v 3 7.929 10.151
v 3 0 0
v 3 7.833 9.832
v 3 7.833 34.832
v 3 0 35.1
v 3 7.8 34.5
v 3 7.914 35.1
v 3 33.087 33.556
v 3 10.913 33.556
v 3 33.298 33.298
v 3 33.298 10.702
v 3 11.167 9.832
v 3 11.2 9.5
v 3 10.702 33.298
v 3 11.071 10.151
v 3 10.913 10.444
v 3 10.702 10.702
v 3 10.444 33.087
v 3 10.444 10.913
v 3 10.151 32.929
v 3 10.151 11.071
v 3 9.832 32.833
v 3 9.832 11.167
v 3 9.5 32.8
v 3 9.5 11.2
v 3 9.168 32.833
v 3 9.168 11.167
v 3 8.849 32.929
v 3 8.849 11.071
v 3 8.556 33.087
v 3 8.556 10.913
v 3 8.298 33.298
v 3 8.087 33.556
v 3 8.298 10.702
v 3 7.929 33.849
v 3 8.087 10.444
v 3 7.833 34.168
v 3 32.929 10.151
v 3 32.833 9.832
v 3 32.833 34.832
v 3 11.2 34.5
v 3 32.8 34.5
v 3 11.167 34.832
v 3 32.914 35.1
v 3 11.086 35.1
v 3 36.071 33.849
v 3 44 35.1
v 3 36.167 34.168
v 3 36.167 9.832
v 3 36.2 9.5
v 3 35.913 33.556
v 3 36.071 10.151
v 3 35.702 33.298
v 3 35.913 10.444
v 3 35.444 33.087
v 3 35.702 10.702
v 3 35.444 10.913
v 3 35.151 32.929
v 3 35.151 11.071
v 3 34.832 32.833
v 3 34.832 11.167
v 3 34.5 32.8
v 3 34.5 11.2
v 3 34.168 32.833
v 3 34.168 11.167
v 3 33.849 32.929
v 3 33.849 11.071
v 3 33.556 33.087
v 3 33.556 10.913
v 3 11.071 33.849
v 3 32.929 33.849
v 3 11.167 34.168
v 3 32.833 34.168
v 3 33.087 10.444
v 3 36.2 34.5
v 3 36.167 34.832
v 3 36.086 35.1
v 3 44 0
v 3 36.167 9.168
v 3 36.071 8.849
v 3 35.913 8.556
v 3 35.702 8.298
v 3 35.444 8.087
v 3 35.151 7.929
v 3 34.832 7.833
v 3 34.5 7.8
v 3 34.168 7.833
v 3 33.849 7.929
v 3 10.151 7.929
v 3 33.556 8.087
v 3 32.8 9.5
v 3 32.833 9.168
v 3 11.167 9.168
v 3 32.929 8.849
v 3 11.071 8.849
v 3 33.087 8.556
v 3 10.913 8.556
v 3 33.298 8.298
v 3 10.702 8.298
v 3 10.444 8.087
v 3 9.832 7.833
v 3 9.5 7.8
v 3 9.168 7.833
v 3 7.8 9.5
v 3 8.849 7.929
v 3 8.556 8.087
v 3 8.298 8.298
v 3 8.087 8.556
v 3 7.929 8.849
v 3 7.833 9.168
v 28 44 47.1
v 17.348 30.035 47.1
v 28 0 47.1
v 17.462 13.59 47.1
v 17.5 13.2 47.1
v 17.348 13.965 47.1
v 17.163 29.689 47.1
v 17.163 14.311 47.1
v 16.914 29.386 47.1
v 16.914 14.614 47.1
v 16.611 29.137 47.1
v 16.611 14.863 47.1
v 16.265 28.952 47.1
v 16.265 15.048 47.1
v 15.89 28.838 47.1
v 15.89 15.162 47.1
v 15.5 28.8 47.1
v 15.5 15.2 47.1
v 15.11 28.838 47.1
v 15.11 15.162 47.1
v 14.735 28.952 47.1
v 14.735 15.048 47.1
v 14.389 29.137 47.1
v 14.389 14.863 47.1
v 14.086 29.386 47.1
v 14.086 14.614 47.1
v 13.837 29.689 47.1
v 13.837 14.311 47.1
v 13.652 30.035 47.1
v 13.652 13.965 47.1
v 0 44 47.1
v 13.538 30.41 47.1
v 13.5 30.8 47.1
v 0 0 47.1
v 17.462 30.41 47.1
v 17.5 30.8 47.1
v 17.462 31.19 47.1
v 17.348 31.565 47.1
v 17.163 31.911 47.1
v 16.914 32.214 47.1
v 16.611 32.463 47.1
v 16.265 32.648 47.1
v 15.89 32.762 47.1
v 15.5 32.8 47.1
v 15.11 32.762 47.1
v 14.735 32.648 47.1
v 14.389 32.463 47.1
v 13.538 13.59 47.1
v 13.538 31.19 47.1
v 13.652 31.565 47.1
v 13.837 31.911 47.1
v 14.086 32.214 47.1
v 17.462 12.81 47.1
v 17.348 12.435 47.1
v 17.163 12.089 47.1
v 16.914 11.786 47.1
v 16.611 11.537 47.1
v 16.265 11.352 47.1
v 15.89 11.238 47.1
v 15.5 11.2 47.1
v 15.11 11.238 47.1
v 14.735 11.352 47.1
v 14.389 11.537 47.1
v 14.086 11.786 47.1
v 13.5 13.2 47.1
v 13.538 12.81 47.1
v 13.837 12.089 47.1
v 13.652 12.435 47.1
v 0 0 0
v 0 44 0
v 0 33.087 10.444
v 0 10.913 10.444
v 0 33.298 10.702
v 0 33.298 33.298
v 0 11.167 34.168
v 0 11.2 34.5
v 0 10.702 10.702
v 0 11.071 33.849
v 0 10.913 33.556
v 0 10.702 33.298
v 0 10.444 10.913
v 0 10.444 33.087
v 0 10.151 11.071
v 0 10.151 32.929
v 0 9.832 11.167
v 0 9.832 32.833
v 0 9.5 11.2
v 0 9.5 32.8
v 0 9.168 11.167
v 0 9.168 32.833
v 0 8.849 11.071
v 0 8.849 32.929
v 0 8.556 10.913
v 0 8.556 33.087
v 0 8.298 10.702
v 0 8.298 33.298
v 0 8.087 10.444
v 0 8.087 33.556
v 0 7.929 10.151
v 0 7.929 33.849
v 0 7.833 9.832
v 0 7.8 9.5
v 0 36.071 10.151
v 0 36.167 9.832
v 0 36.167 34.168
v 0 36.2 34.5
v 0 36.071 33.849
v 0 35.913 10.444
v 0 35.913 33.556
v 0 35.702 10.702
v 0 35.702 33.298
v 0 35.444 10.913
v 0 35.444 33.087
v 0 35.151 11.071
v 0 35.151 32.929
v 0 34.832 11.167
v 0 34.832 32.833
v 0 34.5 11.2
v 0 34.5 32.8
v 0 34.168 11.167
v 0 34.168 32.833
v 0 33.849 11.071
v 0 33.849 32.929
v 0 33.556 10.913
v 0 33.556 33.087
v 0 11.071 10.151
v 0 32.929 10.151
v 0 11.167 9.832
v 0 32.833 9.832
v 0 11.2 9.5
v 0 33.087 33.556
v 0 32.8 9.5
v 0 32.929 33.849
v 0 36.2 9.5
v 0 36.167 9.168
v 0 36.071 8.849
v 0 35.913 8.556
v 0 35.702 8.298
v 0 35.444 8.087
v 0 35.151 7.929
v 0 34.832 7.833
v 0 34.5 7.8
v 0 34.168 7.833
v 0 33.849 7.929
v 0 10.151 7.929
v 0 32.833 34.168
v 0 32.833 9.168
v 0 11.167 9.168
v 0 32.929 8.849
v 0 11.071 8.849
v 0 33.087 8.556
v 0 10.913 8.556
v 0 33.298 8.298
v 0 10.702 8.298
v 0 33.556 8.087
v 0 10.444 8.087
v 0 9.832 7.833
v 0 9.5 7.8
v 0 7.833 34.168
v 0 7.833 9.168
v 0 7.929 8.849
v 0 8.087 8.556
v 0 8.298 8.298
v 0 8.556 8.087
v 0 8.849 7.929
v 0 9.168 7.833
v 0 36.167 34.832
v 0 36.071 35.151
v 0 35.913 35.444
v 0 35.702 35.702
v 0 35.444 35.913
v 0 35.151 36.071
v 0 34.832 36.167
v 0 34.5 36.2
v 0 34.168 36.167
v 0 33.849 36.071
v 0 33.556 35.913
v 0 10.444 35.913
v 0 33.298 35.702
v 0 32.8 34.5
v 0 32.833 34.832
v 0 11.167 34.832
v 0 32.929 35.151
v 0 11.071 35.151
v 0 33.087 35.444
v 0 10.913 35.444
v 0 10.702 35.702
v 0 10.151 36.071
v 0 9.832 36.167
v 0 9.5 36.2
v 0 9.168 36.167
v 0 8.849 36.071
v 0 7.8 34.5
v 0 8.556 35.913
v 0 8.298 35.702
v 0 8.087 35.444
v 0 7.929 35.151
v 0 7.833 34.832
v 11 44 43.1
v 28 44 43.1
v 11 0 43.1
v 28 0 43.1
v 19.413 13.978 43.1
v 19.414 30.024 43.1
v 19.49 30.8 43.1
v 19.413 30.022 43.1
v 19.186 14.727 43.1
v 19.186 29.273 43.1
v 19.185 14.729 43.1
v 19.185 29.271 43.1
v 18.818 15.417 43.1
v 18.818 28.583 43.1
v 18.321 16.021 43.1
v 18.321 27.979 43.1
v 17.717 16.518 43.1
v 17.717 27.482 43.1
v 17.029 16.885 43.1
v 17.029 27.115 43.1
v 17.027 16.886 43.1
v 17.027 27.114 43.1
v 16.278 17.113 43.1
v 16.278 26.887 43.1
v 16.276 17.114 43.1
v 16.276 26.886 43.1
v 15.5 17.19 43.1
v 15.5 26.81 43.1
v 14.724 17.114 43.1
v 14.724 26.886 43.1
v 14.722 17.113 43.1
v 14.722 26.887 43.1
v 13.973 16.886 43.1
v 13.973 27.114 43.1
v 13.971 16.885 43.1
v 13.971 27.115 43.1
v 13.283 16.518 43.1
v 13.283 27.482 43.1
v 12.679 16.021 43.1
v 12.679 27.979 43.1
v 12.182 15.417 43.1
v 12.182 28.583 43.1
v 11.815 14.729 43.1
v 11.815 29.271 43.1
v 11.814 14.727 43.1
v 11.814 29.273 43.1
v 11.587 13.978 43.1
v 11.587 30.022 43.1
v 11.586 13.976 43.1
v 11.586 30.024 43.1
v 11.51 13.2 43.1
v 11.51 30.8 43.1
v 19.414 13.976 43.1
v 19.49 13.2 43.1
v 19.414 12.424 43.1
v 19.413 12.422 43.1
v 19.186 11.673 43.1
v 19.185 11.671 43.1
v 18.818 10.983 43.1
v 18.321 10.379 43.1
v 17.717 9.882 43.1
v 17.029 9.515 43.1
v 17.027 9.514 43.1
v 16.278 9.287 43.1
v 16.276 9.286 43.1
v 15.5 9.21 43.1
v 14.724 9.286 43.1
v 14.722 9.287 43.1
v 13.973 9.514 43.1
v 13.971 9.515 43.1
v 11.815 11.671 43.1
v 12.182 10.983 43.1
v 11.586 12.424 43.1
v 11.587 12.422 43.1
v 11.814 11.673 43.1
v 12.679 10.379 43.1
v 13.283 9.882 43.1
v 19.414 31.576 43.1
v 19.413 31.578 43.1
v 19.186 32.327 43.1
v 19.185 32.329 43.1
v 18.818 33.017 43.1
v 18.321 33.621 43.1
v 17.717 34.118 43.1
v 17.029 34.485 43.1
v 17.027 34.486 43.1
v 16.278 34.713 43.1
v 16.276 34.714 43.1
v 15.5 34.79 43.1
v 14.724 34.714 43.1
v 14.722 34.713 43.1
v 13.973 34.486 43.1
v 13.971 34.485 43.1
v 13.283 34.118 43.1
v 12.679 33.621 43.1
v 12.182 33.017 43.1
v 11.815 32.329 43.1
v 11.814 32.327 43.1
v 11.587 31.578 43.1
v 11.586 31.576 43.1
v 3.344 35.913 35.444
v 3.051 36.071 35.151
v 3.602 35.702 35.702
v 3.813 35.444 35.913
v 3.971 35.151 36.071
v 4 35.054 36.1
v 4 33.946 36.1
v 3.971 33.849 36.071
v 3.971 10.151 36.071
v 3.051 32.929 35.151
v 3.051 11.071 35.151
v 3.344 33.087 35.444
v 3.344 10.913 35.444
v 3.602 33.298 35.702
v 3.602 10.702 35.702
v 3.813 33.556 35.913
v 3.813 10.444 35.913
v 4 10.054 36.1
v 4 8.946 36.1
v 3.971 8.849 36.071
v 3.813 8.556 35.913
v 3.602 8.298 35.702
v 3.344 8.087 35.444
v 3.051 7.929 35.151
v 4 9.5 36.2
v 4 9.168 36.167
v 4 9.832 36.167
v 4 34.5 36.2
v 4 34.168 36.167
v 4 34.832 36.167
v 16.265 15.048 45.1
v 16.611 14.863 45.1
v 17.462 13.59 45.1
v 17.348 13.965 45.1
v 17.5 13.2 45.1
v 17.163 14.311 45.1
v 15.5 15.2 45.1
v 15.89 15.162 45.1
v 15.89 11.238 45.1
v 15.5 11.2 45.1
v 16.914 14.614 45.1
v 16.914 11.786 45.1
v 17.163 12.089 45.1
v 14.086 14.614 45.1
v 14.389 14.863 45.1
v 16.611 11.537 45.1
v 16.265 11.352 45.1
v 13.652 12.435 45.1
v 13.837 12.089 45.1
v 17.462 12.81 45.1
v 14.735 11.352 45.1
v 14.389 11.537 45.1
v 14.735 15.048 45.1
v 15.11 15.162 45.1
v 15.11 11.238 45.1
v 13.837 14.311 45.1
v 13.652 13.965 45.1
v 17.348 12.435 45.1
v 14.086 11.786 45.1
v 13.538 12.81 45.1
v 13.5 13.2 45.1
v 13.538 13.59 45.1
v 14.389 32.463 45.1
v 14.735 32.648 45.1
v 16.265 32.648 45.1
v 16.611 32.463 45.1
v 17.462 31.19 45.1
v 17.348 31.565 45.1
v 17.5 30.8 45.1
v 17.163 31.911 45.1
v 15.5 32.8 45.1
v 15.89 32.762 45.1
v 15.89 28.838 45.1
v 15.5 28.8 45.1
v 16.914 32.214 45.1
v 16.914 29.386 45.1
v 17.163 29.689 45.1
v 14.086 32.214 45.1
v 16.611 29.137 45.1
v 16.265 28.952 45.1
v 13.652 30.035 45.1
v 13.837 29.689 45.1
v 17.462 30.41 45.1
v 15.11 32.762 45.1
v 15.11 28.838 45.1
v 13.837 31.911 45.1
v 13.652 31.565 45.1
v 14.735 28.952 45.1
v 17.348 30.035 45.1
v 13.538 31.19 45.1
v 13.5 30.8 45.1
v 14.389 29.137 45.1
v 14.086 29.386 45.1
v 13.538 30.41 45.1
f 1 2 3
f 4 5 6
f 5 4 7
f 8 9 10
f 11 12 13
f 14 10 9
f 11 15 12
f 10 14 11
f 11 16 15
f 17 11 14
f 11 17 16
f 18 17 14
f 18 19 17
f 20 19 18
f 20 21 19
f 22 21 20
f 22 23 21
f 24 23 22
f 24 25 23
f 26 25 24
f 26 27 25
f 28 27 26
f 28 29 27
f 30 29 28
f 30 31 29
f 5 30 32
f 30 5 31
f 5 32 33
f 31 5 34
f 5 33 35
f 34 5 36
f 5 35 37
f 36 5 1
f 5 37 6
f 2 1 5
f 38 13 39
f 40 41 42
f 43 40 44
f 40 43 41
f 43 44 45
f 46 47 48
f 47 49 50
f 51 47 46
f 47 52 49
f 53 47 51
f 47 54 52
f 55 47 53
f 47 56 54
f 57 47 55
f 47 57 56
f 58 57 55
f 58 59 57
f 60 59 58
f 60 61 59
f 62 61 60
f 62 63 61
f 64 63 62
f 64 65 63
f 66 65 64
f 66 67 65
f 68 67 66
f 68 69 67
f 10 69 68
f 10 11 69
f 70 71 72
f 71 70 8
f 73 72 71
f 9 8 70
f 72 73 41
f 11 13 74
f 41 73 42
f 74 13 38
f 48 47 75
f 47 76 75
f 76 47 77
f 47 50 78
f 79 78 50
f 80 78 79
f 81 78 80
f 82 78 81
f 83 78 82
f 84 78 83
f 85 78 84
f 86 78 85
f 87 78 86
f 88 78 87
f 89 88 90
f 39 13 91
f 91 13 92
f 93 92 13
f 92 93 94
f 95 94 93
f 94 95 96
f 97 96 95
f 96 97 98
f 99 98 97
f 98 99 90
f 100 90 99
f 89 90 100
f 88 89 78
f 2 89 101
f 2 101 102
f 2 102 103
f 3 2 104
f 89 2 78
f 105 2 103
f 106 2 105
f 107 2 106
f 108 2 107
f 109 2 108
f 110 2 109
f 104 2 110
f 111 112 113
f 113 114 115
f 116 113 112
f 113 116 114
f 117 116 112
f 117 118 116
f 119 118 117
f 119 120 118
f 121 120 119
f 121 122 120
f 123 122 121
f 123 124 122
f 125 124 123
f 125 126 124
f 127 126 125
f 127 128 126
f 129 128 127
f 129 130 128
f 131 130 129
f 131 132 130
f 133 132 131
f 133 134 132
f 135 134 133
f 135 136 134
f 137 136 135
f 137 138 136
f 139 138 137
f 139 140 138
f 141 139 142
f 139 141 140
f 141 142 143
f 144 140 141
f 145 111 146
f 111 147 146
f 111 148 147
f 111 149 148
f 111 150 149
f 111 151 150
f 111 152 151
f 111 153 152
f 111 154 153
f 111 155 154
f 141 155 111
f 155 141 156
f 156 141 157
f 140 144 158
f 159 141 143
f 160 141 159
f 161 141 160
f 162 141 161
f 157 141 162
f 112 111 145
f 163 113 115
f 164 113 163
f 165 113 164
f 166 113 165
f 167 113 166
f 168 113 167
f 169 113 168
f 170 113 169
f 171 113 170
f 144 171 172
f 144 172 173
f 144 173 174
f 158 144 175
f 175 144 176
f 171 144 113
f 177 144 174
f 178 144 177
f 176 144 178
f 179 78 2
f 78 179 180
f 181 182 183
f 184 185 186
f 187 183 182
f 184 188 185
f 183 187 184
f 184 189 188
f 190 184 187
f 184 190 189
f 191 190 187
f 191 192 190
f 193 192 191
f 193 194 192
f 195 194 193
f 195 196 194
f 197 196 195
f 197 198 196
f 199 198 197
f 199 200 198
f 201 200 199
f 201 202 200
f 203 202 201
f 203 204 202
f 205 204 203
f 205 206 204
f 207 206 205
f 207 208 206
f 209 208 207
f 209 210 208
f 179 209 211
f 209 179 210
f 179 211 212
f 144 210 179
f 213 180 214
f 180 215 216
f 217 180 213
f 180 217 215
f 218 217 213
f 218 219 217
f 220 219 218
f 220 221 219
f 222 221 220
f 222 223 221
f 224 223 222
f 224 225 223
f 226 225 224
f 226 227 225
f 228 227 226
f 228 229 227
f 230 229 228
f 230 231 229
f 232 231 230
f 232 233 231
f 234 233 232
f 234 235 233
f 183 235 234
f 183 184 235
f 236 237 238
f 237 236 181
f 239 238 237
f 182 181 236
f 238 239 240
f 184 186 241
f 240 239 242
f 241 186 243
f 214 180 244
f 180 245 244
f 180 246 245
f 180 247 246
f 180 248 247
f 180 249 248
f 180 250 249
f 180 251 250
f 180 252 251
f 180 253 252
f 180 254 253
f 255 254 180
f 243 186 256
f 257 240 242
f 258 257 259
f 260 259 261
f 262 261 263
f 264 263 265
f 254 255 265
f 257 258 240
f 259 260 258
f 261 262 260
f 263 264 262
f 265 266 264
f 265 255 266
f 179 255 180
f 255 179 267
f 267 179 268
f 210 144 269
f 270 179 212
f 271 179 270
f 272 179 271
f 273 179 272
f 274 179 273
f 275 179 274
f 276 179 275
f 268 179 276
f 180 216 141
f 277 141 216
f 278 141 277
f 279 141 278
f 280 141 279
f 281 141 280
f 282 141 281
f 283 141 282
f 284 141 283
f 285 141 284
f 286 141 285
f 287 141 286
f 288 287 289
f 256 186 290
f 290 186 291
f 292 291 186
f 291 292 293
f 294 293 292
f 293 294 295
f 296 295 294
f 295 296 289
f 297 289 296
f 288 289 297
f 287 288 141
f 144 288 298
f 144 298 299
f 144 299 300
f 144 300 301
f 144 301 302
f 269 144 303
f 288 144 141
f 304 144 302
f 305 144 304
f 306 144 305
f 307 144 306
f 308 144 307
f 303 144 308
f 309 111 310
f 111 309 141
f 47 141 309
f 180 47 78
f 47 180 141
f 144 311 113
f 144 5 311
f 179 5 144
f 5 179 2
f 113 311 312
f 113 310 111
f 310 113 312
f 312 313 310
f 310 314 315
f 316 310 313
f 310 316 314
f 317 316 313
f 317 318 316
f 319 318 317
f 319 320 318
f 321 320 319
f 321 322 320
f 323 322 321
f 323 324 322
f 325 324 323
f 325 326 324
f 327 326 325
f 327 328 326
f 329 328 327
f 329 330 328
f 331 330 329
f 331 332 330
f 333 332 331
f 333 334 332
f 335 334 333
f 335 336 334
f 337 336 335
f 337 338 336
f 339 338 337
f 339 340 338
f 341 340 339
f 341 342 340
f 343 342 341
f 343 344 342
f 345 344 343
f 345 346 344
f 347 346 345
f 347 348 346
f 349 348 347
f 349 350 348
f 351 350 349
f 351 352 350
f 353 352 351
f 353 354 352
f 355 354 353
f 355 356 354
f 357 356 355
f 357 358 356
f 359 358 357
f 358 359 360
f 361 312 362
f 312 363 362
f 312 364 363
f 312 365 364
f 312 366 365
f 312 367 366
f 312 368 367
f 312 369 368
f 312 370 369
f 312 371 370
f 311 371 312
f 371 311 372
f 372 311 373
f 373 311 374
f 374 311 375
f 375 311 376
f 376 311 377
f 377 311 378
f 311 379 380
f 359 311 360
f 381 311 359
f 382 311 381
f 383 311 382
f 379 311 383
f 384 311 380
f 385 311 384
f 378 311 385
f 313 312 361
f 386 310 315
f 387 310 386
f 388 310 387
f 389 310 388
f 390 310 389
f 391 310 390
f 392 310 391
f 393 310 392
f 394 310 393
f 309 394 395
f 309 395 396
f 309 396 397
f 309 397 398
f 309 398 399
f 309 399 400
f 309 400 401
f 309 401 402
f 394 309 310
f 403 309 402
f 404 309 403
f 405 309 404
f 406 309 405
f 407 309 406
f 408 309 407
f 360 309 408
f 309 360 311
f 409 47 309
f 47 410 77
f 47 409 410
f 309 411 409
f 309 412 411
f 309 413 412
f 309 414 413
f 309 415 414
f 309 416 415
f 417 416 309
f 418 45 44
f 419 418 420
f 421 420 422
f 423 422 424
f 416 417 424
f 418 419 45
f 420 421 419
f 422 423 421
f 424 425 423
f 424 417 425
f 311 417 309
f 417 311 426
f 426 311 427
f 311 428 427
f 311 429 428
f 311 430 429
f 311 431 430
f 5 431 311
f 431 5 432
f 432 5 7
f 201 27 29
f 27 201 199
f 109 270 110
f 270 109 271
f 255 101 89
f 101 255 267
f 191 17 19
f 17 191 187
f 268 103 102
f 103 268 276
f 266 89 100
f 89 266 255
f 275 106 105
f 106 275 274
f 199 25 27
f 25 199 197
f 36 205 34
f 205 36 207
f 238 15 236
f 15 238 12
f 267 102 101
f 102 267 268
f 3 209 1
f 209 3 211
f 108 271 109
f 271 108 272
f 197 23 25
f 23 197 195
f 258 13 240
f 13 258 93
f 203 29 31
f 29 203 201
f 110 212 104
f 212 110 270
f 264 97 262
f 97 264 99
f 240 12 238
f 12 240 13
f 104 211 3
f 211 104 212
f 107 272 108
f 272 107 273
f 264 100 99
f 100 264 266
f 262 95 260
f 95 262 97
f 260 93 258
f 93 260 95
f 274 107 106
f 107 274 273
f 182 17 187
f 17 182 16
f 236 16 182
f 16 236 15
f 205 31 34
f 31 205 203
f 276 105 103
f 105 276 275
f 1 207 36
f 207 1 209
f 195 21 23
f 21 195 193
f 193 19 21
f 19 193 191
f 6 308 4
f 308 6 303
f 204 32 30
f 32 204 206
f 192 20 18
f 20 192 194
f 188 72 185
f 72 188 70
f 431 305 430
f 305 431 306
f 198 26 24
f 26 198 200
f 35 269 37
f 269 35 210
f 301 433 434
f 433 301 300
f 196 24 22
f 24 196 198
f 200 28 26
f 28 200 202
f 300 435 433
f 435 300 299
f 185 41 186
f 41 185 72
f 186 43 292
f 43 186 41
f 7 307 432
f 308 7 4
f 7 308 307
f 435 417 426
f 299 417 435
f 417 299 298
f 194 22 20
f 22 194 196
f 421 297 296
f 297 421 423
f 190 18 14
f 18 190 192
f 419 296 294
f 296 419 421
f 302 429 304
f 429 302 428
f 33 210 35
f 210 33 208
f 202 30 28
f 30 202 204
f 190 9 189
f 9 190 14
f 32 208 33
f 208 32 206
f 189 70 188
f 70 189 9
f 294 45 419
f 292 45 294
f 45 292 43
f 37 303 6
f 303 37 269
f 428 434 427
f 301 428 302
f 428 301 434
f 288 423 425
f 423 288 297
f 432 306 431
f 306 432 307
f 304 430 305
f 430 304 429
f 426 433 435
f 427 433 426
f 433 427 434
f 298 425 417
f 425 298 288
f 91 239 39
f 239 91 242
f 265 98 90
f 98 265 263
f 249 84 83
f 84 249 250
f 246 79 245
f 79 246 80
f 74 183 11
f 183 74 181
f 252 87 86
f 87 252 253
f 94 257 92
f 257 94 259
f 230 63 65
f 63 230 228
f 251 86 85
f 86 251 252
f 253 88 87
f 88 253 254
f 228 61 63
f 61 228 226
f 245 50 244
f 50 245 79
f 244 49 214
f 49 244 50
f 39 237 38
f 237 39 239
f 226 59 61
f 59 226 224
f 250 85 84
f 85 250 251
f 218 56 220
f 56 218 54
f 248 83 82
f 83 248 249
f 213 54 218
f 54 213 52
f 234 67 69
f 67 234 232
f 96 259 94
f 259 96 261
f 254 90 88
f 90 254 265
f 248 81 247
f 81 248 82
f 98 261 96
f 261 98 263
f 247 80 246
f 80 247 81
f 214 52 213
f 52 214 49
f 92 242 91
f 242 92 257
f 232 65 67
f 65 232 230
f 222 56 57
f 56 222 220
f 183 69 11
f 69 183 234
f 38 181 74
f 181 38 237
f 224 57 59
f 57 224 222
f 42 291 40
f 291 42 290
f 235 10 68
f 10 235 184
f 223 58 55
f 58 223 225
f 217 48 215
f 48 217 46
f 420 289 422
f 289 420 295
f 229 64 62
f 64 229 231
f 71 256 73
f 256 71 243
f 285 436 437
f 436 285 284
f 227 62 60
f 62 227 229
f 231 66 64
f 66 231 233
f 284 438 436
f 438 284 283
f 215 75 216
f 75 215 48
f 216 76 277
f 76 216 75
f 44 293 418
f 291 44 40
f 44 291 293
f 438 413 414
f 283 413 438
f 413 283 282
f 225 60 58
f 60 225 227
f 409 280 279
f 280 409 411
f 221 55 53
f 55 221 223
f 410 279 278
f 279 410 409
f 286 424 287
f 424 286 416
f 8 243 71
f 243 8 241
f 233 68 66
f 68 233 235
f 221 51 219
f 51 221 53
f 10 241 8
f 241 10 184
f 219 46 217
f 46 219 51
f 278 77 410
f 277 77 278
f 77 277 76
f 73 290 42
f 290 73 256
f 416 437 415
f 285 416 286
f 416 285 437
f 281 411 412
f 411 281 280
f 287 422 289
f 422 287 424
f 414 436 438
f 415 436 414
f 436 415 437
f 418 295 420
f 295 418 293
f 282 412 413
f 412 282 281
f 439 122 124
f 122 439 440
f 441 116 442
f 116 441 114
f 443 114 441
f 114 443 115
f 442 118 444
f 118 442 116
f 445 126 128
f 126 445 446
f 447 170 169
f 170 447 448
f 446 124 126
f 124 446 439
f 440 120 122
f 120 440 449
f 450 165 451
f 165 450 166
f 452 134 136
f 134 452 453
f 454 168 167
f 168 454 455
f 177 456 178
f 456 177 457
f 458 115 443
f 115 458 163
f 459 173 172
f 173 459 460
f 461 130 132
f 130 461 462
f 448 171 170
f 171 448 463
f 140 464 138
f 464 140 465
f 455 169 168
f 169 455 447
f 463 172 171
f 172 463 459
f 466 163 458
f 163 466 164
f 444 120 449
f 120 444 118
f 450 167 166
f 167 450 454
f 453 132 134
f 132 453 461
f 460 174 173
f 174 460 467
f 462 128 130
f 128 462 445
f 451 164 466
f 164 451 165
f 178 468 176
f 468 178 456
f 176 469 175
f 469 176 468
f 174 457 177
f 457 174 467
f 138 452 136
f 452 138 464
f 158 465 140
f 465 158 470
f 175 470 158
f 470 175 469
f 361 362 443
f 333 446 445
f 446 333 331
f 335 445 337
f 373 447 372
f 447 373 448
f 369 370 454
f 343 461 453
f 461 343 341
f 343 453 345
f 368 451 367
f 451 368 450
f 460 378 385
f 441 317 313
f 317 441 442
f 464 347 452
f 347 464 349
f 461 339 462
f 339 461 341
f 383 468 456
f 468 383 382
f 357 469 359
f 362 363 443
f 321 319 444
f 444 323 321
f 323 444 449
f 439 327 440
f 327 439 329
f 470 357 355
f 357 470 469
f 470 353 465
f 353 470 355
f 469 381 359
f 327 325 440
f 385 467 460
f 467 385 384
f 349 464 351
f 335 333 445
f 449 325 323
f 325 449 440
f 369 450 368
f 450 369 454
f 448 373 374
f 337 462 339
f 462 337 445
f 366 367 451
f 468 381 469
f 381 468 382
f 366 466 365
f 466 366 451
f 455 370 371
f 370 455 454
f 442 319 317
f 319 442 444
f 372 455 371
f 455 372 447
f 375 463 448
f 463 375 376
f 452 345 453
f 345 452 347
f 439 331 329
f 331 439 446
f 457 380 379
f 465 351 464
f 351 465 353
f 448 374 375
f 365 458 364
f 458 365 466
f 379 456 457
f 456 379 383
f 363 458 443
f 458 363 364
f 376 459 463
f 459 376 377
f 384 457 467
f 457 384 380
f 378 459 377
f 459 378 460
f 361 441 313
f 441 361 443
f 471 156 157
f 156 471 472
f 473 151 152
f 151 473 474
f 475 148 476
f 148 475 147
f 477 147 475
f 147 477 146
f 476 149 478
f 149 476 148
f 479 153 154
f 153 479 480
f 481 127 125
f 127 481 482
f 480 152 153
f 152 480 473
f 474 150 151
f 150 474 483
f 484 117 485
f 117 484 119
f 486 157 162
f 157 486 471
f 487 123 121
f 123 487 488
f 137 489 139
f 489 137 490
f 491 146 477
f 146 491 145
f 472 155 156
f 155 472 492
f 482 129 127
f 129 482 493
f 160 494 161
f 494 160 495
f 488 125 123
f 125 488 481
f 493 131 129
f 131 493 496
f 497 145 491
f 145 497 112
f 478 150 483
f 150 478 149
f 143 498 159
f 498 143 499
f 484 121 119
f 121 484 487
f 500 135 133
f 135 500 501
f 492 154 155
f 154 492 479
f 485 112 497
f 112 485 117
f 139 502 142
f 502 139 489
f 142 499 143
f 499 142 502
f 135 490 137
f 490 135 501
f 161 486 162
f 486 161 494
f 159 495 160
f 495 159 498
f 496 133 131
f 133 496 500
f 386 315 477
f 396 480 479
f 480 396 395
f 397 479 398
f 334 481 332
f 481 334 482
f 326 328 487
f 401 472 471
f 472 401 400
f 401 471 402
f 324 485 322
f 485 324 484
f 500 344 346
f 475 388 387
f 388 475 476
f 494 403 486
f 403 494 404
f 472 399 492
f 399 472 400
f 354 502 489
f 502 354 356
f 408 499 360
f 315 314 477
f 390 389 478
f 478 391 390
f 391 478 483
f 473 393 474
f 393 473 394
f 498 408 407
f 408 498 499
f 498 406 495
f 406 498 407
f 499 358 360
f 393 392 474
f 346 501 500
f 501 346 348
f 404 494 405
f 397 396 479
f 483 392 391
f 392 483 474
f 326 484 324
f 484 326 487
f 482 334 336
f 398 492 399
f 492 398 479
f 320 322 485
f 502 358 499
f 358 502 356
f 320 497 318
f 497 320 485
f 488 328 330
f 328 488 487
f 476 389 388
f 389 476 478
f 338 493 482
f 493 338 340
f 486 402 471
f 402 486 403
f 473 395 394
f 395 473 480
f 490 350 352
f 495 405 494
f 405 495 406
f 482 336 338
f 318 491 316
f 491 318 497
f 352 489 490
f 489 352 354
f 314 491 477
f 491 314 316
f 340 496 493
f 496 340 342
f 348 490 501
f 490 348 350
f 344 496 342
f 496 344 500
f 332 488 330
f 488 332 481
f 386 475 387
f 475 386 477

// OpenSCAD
// SPDX-License-Identifier: CC-BY-NC-SA-4.0
// css610-underdesk-mount — L-bracket (printed L+R pair) to hang a MikroTik
// CSS610-8G-2S+IN under a desk: bolts to the device side M3 pattern, top flange
// flush with the device top, wood screws up into the desk. Standalone (no libs);
// device data project-local [A] MikroTik dimensional drawing. See README.

/* [Device data — MikroTik CSS610-8G-2S+IN, [A] dimensional drawing] */
function _css610_size() = [200.9, 166.6, 47.1];  // W, D, H [A]
// side mount holes (per side): 25x25 square, X from mounting-end edge, Z from bottom. M3.
function _css610_side_holes() = [[9.5,9.5],[9.5,34.5],[34.5,9.5],[34.5,34.5]]; // [A] positions

/* [Bracket] */
leg_thickness = 3; flange_thickness = 4; gusset = 8;
mount_hole = 3.4;   // M3 clearance [A]/[B] user-confirmed
wood_screw = 4; csk_dia = 8;
flange_len = 25; standoff = 0;

assert(len(_css610_side_holes()) == 4, "CSS610 side pattern = 4 holes");
assert(_css610_size()[2] == 47.1, "CSS610 height (flange datum)");

/* [Bracket module]
 * Datum: device side plane at X=0 (leg lies flat on it), device top at
 * Z=H. Leg grows +X (into the bracket, outward from the device); flange
 * sits at the device-top plane and projects further +X (outward). The
 * device itself occupies X <= 0 (see the fit-viz envelope below) so the
 * leg is flush against the device's side face, not embedded in it.
 * VERIFIED (Task 3, #59) via verify-scad-geometry (headless STL render +
 * colored side-profile overlay of the bracket against `% cube(_css610_size())`,
 * translated to sit flush at X<=0 -- see task-3-report.md for the render
 * evidence): 4 M3 holes align to _css610_side_holes() (Y,Z straight-mapped,
 * no further transform needed); flange top is coplanar with the device top
 * (Z = H + standoff, confirmed both algebraically and via the STL bbox
 * check in tests/test_css610_underdesk_mount.sh); wood-screw holes clear
 * the device's physical edge (X0 = leg_thickness + flange_len/2 = 15.5,
 * hole extent [11.5,19.5] entirely on the +X side of the device envelope's
 * X<=0 boundary -- not just the formal X > leg_thickness contract).
 * CONTRACT: 4 M3 clearance holes align to _css610_side_holes(); flange top
 * is coplanar with the device top (Z = H + standoff); wood-screw holes
 * clear the device edge (X > leg_thickness); gusset is a 45 degree
 * (equal-leg) triangle.
 * PRINT ORIENTATION (support-free, Task 3, #59 -- see design-for-print
 * skill): print with the flange's device-facing top (model Z=H+standoff)
 * resting on the bed -- i.e. upside-down relative to the installed
 * orientation, leg rising off the bed. This lines up the countersink's
 * cone axis with the build (Z) direction, mouth-up (the cone widens as
 * print height increases -- self-supporting per the countersink glossary
 * entry, since its half-angle is exactly 45 deg), and the gusset's cross
 * section shrinks monotonically as build height increases (verified by
 * hand: at build height z, gusset X-extent is [leg_thickness, 15-z] for
 * z in [4,12] in the local flange-top-down frame -- strictly shrinking, no
 * new unsupported material ever appears). The 4 M3 holes end up
 * horizontal (bored across layers) in this orientation, but at 3.4mm
 * diameter they're well inside the ~5mm bridging-safe range this repo's
 * design-for-print skill cites, so no teardrop treatment is needed.
 * L/R MIRROR (Task 3, #59): `side` selects "R" (default, as designed) or
 * "L" (mirrored across Y). Because _css610_side_holes()'s Y-values (9.5,
 * 34.5) are symmetric about leg_len/2=22, and the wood-screw Y-positions
 * (leg_len*0.3, leg_len*0.7) are too, mirroring in Y maps this bracket's
 * hole set onto itself -- with this device's current (symmetric) data, the
 * "L" and "R" variants are congruent (literally the same solid, verified
 * in tests/asserts.scad), so one STL currently serves both sides. The
 * `side` param is still exposed/asserted so a future asymmetric hole-data
 * correction produces a correctly mirrored "L" without a module rewrite. */
module css610_underdesk_bracket(side = "R") {
    assert(side == "L" || side == "R", str("side must be \"L\" or \"R\", got \"", side, "\""));
    H = _css610_size()[2];   // 47.1
    holes = _css610_side_holes();
    // leg span: cover the hole pattern (X 9.5..34.5, Z 9.5..34.5) + margin
    // past the max hole X (mapped to leg Y below) to the top of the leg.
    // Margin (9.5) matches the pattern's own min-edge offset, same convention
    // as the hardcoded literal this replaces (34.5 + 9.5 = 44).
    leg_len = max([for (h = holes) h[0]]) + 9.5;   // along the device length (mapped to leg Y here)

    module _body() {
        difference() {
            union() {
                // vertical leg (flat against the device side): plate in the
                // Y-Z plane, leg_thickness thick in X.
                cube([leg_thickness, leg_len, H + standoff]);
                // top flange: horizontal plate at the device-top plane,
                // projecting +X (outward) past the leg's outer face.
                translate([0, 0, H + standoff - flange_thickness])
                    cube([flange_len + leg_thickness, leg_len, flange_thickness]);
                // 45deg gusset at the inside corner (leg<->flange), triangular,
                // support-free bracing under the flange overhang. Right angle at
                // the leg-face/flange-underside corner; legs run +X (along the
                // flange underside) and -Z (down the leg face) so the whole
                // triangle stays AT/BELOW the flange-underside plane (z=0 in this
                // local frame) -- it must never poke above it into/through the
                // flange (verified against brief's representative code, which
                // had the third vertex's sign flipped and punched the gusset
                // apex `gusset - flange_thickness` = 4mm above the flush flange
                // top; caught via STL bbox Z-max = 51.1 instead of the expected
                // H+standoff = 47.1).
                translate([leg_thickness, 0, H + standoff - flange_thickness])
                    rotate([-90, 0, 0]) linear_extrude(leg_len)
                        polygon([[0, 0], [gusset, 0], [0, gusset]]);
            }
            // 4x M3 clearance holes on the side pattern (through the leg, X axis).
            for (h = holes)
                translate([-1, h[0], h[1]])   // map pattern (X_edge, Z) -> (leg Y, Z)
                    rotate([0, 90, 0]) cylinder(h = leg_thickness + 2, d = mount_hole, $fn = 32);
            // 2 countersunk wood-screw holes in the flange (bored through Z),
            // spaced along the flange span; centered past the device edge so
            // the screw clears leg_thickness (X0 = leg_thickness). Screw is
            // driven UP from below the flange (accessible from underneath, per
            // the underdesk-mount orientation) so the countersink opens on the
            // flange's BOTTOM face.
            // NOTE (Task 2, #59 fix): the brief's representative code offset the
            // countersink cone by `-flange_thickness` from the `+1` baseline,
            // which left the cone's wide end 1mm short of the flange bottom
            // (H+standoff-flange_thickness) -- a solid 1mm "floor" blocked the
            // hole from ever opening through, caught via a probe at the hole
            // axis on the bottom-face Z-slice (non-empty = blocked). Fixed by
            // extending the offset an extra 1mm (+ a 0.01mm overshoot) so the
            // cone's wide end lands just past the bottom face and its narrow end
            // (matching wood_screw dia) meets the straight bore with no gap.
            for (fy = [leg_len * 0.3, leg_len * 0.7])
                translate([leg_thickness + flange_len / 2, fy, H + standoff + 1]) {
                    cylinder(h = flange_thickness + 2, d = wood_screw, center = true, $fn = 32);
                    translate([0, 0, -flange_thickness - 1.01])
                        cylinder(h = (csk_dia - wood_screw) / 2 + 0.01, d1 = csk_dia, d2 = wood_screw, $fn = 32);
                }
        }
    }

    if (side == "L")
        translate([0, leg_len, 0]) mirror([0, 1, 0]) _body();
    else
        _body();
}

// Device envelope fit-viz (preview only, `%` -- excluded from STL export).
// Placed flush against the leg's back face: the device occupies X in
// [-_css610_size()[0], 0], Y in [0, _css610_size()[1]], Z in
// [0, _css610_size()[2]], so the leg (X in [0, leg_thickness]) sits flat on
// the device's X=0 side face rather than overlapping it (Task 3, #59 fix --
// verify-scad-geometry's overlay caught the original `% cube(_css610_size())`
// with no translate rendering the device on TOP of/overlapping the bracket,
// since both started at X=0; see task-3-report.md).
translate([-_css610_size()[0], 0, 0]) % cube(_css610_size());
css610_underdesk_bracket();
